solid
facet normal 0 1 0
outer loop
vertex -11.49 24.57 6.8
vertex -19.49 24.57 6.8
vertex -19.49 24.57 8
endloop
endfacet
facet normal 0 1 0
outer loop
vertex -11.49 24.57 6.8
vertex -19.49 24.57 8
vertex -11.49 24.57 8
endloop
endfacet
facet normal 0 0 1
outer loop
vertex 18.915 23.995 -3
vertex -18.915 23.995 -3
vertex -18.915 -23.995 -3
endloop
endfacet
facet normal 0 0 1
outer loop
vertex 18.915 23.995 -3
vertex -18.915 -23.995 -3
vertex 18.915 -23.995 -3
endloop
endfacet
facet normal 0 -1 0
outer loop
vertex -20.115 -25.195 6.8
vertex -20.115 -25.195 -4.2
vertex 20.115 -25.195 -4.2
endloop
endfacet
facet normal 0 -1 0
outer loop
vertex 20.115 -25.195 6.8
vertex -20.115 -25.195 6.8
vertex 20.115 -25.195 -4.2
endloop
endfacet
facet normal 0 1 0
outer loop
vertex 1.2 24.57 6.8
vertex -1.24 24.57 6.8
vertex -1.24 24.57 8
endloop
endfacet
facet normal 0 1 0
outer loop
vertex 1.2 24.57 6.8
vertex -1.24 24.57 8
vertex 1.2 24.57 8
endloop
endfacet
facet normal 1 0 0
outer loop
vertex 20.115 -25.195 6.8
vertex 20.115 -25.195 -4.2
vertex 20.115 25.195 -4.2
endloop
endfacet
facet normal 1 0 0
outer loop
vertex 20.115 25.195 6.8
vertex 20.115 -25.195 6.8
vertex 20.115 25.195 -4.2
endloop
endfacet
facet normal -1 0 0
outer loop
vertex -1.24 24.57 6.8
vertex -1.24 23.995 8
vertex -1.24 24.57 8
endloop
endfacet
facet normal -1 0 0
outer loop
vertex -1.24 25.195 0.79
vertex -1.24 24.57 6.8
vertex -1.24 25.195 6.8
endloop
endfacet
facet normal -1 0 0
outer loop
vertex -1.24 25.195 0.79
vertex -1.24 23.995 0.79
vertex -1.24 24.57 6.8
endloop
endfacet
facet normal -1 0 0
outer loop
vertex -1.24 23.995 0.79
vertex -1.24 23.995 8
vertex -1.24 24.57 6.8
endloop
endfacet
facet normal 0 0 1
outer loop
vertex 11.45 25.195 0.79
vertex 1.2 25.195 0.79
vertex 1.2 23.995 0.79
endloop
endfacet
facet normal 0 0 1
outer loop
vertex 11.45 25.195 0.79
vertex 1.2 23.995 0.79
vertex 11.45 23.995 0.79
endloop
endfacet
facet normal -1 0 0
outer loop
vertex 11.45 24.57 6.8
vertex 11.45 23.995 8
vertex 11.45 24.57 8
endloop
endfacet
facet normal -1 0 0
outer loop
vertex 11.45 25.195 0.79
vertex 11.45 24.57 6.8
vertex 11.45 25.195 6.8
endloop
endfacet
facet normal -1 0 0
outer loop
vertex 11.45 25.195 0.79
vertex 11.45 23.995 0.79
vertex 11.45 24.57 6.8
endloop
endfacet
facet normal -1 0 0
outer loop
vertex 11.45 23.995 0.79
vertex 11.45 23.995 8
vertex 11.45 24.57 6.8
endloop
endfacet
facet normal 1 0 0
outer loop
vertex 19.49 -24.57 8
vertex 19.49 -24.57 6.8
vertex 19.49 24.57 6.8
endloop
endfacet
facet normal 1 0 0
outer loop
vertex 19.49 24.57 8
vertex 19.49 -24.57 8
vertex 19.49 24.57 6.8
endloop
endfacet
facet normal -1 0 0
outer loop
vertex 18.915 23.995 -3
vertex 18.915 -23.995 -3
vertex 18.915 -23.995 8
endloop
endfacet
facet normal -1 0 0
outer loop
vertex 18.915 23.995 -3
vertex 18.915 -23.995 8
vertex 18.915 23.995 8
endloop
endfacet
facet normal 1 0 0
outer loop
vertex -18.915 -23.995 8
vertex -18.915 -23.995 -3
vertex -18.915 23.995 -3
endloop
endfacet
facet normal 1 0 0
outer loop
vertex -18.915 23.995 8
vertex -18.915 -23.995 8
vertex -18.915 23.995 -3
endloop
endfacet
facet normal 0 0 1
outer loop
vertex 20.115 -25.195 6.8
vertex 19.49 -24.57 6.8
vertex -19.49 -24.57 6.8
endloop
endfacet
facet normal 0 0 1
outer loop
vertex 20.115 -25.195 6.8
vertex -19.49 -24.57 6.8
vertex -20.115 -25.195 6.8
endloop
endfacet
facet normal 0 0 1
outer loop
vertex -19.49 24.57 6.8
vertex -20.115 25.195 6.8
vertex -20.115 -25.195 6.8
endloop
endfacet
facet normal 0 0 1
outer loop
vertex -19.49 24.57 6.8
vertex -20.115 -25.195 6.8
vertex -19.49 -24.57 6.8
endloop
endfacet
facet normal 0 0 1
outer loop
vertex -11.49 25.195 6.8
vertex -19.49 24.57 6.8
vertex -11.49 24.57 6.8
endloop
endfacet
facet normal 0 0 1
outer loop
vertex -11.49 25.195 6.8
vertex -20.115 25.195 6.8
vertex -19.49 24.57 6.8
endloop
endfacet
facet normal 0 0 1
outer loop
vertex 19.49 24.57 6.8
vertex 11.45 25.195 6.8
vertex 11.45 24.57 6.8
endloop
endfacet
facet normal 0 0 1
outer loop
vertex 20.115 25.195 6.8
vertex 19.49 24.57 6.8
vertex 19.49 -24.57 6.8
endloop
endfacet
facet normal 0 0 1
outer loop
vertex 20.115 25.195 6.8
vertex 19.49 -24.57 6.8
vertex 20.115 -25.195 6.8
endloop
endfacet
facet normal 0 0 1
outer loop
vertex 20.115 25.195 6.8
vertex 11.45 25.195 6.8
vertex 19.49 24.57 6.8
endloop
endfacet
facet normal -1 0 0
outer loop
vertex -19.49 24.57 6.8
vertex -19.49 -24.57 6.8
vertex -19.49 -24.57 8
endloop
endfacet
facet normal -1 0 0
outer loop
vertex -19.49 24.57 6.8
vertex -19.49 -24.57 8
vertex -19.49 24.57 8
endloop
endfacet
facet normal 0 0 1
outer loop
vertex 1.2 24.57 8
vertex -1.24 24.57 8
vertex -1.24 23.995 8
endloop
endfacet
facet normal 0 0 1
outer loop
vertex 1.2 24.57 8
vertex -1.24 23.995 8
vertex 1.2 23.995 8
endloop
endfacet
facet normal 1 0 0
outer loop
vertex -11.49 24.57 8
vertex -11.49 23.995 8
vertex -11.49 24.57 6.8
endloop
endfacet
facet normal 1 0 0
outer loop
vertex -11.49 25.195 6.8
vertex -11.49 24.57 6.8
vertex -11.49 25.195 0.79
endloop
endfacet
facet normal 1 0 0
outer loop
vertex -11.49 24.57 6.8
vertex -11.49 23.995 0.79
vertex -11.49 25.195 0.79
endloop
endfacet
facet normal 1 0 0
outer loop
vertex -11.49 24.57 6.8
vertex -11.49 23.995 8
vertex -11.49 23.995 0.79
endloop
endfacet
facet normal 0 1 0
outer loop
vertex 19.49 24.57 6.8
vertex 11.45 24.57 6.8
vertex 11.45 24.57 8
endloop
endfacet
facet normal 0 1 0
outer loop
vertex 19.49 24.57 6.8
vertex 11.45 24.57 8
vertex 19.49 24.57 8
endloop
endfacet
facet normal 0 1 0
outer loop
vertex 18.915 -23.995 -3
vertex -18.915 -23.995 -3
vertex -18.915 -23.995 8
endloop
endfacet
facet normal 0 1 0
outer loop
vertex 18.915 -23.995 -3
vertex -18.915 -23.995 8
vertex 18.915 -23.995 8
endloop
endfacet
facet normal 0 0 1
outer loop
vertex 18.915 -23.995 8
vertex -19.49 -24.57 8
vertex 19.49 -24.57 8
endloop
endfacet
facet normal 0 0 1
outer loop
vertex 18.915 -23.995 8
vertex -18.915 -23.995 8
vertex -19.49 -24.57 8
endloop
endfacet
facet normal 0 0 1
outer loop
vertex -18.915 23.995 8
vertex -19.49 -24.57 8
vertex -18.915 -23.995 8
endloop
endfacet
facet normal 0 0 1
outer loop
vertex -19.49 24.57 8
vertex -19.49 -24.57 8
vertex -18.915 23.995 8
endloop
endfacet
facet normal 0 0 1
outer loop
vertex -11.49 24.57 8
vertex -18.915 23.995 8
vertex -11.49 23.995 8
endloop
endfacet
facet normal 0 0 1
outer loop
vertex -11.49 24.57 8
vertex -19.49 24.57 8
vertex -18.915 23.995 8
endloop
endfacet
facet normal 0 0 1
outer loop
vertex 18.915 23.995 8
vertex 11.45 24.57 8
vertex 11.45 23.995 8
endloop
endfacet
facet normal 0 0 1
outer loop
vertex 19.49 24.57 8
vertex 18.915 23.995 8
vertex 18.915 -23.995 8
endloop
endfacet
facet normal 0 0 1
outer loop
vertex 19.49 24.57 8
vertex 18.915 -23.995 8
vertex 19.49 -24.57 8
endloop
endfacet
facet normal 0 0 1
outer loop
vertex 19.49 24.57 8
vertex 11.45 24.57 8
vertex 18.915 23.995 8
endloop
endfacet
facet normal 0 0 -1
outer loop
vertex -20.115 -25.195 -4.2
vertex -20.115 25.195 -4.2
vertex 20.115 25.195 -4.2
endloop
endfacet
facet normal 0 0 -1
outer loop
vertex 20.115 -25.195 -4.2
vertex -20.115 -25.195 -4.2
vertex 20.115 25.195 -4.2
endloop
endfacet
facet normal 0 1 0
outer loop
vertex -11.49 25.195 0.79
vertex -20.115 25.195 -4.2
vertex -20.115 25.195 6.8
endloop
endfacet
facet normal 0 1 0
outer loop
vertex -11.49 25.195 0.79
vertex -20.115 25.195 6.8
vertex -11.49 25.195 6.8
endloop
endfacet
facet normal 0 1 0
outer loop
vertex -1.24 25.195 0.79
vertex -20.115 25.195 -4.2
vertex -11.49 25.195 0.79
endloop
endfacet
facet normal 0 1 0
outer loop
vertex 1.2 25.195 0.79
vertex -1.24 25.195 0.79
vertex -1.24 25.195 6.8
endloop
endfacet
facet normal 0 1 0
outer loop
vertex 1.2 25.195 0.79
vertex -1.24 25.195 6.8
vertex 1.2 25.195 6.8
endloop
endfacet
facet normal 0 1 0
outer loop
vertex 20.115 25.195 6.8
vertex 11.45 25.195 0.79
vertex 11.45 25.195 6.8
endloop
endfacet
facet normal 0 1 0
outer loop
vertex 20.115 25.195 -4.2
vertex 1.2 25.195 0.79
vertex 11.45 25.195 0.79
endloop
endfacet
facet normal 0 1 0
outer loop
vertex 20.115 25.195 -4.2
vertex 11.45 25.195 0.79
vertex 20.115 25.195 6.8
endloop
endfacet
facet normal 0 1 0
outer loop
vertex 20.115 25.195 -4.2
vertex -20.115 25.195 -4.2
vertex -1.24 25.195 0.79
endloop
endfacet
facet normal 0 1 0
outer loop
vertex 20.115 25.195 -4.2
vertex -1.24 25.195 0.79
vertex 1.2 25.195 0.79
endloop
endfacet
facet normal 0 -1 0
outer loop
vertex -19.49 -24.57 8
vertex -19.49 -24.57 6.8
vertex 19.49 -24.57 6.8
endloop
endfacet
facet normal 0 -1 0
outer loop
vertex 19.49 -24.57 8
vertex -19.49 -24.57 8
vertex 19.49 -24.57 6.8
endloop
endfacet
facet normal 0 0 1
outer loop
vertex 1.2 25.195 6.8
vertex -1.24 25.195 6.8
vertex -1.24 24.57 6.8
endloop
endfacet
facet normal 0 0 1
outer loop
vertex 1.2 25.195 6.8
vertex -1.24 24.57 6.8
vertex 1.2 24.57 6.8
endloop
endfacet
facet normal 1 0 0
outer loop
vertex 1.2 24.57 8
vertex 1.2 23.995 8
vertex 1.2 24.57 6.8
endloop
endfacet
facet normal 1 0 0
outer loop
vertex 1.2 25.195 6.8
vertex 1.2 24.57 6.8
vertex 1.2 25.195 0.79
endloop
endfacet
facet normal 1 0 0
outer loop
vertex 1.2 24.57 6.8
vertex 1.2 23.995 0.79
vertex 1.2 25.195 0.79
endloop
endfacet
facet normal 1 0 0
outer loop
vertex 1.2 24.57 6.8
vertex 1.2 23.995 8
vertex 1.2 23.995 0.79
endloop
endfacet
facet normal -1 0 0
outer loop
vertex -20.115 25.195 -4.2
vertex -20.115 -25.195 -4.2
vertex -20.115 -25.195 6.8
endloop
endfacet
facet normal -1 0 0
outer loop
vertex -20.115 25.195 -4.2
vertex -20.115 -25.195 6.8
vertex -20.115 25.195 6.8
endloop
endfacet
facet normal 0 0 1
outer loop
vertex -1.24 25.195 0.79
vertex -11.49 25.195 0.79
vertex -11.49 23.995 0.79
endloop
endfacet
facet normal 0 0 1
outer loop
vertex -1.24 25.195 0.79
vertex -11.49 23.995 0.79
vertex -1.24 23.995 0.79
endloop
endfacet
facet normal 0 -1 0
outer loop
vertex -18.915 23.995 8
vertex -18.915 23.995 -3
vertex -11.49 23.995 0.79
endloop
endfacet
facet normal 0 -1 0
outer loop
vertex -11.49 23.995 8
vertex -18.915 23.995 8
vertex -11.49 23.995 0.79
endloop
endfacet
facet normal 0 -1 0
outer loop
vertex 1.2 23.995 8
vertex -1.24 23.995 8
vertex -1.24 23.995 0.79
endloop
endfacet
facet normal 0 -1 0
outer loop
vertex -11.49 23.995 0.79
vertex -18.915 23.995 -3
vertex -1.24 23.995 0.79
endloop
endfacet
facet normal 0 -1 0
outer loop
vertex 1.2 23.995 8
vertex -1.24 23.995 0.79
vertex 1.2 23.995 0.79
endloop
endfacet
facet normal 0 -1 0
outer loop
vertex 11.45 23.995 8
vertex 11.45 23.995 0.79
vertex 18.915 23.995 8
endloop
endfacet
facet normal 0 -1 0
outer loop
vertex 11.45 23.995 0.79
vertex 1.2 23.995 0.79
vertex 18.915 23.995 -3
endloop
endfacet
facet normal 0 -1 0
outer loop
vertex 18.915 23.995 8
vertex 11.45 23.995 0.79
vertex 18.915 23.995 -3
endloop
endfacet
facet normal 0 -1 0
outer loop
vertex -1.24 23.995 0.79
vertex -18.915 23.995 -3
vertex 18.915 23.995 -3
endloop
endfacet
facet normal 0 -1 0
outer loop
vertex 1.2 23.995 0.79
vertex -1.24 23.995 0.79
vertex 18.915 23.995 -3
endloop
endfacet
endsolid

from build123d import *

# Parameters (mm, degrees)
BOX029_W       = 10.25
BOX029_H       = 12
BOX029_DEPTH   = 13
BOX_W          = 10.25
BOX_H          = 12
BOX_DEPTH      = 13
BOX025_W       = 37.83
BOX025_H       = 47.99
BOX025_DEPTH   = 1.2
BOX026_W       = 38.98
BOX026_H       = 49.14
BOX026_DEPTH   = 1.2
BOX027_W       = 37.83
BOX027_H       = 47.99
BOX027_DEPTH   = 1.2
BOX028_W       = 40.25
BOX028_H       = 50.41
BOX028_DEPTH   = 1.2
BOX013_W       = 37.83
BOX013_H       = 47.99
BOX013_DEPTH   = 11
THICKNESS003_T = 1.2


with BuildPart() as cube029:
    # Box029 → Box029 (new body)
    with BuildSketch(Plane(origin=(-11.49, 14, 0.79), x_dir=(1, 0, 0), z_dir=(0, 0, 1))):
        with Locations((5.125, 6)):
            Rectangle(BOX029_W, BOX029_H)
    extrude(amount=BOX029_DEPTH)


with BuildPart() as cube:
    # Box → Box (new body)
    with BuildSketch(Plane(origin=(1.2, 14, 0.79), x_dir=(1, 0, 0), z_dir=(0, 0, 1))):
        with Locations((5.125, 6)):
            Rectangle(BOX_W, BOX_H)
    extrude(amount=BOX_DEPTH)


with BuildPart() as cube025:
    # Box025 → Box025 (new body)
    with BuildSketch(Plane(origin=(-18.91, -24, 0), x_dir=(1, 0, 0), z_dir=(0, 0, 1))):
        with Locations((18.915, 23.995)):
            Rectangle(BOX025_W, BOX025_H)
    extrude(amount=BOX025_DEPTH)


with BuildPart() as cut006:
    # Box026 → Box026 (new body)
    with BuildSketch(Plane(origin=(-19.49, -24.57, 0), x_dir=(1, 0, 0), z_dir=(0, 0, 1))):
        with Locations((19.49, 24.57)):
            Rectangle(BOX026_W, BOX026_H)
    extrude(amount=BOX026_DEPTH)

    # Cut006: cut Cube025
    add(cube025.part, mode=Mode.SUBTRACT)


with BuildPart() as cube027:
    # Box027 → Box027 (new body)
    with BuildSketch(Plane(origin=(-18.91, -24, 0), x_dir=(1, 0, 0), z_dir=(0, 0, 1))):
        with Locations((18.915, 23.995)):
            Rectangle(BOX027_W, BOX027_H)
    extrude(amount=BOX027_DEPTH)


with BuildPart() as cut008:
    # Box028 → Box028 (new body)
    with BuildSketch(Plane(origin=(-20.125, -25.205, 0), x_dir=(1, 0, 0), z_dir=(0, 0, 1))):
        with Locations((20.125, 25.205)):
            Rectangle(BOX028_W, BOX028_H)
    extrude(amount=BOX028_DEPTH)

    # Cut007: cut Cube027
    add(cube027.part, mode=Mode.SUBTRACT)

    # Cut008: cut Cut006
    add(cut006.part, mode=Mode.SUBTRACT)


with BuildPart() as cut008_1:
    # Cut008 placement: moved
    add(cut008.part.moved(Location((0, 0, 6.8))))


with BuildPart() as cut010:
    # Box013 → Box013 (new body)
    with BuildSketch(Plane(origin=(-18.915, -23.995, -3), x_dir=(1, 0, 0), z_dir=(0, 0, 1))):
        with Locations((18.915, 23.995)):
            Rectangle(BOX013_W, BOX013_H)
    extrude(amount=BOX013_DEPTH)


with BuildPart() as cut010_1:
    # BaseFeature001 placement: moved
    add(cut010.part.moved(Location((18.915, 23.995, 3))))

    # Thickness003
    thickness003_openings = [cut010_1.faces().sort_by_distance(p)[0] for p in [
        (18.915, 23.995, 11),
    ]]
    offset(amount=THICKNESS003_T, openings=thickness003_openings, kind=Kind.INTERSECTION)


with BuildPart() as cut010_2:
    # Body001 placement: moved
    add(cut010_1.part.moved(Location((-18.915, -23.995, -3))))

    # Cut: cut Cut008
    add(cut008_1.part, mode=Mode.SUBTRACT)

    # Cut009: cut Cube
    add(cube.part, mode=Mode.SUBTRACT)

    # Cut010: cut Cube029
    add(cube029.part, mode=Mode.SUBTRACT)


solid = cut010_2.part
